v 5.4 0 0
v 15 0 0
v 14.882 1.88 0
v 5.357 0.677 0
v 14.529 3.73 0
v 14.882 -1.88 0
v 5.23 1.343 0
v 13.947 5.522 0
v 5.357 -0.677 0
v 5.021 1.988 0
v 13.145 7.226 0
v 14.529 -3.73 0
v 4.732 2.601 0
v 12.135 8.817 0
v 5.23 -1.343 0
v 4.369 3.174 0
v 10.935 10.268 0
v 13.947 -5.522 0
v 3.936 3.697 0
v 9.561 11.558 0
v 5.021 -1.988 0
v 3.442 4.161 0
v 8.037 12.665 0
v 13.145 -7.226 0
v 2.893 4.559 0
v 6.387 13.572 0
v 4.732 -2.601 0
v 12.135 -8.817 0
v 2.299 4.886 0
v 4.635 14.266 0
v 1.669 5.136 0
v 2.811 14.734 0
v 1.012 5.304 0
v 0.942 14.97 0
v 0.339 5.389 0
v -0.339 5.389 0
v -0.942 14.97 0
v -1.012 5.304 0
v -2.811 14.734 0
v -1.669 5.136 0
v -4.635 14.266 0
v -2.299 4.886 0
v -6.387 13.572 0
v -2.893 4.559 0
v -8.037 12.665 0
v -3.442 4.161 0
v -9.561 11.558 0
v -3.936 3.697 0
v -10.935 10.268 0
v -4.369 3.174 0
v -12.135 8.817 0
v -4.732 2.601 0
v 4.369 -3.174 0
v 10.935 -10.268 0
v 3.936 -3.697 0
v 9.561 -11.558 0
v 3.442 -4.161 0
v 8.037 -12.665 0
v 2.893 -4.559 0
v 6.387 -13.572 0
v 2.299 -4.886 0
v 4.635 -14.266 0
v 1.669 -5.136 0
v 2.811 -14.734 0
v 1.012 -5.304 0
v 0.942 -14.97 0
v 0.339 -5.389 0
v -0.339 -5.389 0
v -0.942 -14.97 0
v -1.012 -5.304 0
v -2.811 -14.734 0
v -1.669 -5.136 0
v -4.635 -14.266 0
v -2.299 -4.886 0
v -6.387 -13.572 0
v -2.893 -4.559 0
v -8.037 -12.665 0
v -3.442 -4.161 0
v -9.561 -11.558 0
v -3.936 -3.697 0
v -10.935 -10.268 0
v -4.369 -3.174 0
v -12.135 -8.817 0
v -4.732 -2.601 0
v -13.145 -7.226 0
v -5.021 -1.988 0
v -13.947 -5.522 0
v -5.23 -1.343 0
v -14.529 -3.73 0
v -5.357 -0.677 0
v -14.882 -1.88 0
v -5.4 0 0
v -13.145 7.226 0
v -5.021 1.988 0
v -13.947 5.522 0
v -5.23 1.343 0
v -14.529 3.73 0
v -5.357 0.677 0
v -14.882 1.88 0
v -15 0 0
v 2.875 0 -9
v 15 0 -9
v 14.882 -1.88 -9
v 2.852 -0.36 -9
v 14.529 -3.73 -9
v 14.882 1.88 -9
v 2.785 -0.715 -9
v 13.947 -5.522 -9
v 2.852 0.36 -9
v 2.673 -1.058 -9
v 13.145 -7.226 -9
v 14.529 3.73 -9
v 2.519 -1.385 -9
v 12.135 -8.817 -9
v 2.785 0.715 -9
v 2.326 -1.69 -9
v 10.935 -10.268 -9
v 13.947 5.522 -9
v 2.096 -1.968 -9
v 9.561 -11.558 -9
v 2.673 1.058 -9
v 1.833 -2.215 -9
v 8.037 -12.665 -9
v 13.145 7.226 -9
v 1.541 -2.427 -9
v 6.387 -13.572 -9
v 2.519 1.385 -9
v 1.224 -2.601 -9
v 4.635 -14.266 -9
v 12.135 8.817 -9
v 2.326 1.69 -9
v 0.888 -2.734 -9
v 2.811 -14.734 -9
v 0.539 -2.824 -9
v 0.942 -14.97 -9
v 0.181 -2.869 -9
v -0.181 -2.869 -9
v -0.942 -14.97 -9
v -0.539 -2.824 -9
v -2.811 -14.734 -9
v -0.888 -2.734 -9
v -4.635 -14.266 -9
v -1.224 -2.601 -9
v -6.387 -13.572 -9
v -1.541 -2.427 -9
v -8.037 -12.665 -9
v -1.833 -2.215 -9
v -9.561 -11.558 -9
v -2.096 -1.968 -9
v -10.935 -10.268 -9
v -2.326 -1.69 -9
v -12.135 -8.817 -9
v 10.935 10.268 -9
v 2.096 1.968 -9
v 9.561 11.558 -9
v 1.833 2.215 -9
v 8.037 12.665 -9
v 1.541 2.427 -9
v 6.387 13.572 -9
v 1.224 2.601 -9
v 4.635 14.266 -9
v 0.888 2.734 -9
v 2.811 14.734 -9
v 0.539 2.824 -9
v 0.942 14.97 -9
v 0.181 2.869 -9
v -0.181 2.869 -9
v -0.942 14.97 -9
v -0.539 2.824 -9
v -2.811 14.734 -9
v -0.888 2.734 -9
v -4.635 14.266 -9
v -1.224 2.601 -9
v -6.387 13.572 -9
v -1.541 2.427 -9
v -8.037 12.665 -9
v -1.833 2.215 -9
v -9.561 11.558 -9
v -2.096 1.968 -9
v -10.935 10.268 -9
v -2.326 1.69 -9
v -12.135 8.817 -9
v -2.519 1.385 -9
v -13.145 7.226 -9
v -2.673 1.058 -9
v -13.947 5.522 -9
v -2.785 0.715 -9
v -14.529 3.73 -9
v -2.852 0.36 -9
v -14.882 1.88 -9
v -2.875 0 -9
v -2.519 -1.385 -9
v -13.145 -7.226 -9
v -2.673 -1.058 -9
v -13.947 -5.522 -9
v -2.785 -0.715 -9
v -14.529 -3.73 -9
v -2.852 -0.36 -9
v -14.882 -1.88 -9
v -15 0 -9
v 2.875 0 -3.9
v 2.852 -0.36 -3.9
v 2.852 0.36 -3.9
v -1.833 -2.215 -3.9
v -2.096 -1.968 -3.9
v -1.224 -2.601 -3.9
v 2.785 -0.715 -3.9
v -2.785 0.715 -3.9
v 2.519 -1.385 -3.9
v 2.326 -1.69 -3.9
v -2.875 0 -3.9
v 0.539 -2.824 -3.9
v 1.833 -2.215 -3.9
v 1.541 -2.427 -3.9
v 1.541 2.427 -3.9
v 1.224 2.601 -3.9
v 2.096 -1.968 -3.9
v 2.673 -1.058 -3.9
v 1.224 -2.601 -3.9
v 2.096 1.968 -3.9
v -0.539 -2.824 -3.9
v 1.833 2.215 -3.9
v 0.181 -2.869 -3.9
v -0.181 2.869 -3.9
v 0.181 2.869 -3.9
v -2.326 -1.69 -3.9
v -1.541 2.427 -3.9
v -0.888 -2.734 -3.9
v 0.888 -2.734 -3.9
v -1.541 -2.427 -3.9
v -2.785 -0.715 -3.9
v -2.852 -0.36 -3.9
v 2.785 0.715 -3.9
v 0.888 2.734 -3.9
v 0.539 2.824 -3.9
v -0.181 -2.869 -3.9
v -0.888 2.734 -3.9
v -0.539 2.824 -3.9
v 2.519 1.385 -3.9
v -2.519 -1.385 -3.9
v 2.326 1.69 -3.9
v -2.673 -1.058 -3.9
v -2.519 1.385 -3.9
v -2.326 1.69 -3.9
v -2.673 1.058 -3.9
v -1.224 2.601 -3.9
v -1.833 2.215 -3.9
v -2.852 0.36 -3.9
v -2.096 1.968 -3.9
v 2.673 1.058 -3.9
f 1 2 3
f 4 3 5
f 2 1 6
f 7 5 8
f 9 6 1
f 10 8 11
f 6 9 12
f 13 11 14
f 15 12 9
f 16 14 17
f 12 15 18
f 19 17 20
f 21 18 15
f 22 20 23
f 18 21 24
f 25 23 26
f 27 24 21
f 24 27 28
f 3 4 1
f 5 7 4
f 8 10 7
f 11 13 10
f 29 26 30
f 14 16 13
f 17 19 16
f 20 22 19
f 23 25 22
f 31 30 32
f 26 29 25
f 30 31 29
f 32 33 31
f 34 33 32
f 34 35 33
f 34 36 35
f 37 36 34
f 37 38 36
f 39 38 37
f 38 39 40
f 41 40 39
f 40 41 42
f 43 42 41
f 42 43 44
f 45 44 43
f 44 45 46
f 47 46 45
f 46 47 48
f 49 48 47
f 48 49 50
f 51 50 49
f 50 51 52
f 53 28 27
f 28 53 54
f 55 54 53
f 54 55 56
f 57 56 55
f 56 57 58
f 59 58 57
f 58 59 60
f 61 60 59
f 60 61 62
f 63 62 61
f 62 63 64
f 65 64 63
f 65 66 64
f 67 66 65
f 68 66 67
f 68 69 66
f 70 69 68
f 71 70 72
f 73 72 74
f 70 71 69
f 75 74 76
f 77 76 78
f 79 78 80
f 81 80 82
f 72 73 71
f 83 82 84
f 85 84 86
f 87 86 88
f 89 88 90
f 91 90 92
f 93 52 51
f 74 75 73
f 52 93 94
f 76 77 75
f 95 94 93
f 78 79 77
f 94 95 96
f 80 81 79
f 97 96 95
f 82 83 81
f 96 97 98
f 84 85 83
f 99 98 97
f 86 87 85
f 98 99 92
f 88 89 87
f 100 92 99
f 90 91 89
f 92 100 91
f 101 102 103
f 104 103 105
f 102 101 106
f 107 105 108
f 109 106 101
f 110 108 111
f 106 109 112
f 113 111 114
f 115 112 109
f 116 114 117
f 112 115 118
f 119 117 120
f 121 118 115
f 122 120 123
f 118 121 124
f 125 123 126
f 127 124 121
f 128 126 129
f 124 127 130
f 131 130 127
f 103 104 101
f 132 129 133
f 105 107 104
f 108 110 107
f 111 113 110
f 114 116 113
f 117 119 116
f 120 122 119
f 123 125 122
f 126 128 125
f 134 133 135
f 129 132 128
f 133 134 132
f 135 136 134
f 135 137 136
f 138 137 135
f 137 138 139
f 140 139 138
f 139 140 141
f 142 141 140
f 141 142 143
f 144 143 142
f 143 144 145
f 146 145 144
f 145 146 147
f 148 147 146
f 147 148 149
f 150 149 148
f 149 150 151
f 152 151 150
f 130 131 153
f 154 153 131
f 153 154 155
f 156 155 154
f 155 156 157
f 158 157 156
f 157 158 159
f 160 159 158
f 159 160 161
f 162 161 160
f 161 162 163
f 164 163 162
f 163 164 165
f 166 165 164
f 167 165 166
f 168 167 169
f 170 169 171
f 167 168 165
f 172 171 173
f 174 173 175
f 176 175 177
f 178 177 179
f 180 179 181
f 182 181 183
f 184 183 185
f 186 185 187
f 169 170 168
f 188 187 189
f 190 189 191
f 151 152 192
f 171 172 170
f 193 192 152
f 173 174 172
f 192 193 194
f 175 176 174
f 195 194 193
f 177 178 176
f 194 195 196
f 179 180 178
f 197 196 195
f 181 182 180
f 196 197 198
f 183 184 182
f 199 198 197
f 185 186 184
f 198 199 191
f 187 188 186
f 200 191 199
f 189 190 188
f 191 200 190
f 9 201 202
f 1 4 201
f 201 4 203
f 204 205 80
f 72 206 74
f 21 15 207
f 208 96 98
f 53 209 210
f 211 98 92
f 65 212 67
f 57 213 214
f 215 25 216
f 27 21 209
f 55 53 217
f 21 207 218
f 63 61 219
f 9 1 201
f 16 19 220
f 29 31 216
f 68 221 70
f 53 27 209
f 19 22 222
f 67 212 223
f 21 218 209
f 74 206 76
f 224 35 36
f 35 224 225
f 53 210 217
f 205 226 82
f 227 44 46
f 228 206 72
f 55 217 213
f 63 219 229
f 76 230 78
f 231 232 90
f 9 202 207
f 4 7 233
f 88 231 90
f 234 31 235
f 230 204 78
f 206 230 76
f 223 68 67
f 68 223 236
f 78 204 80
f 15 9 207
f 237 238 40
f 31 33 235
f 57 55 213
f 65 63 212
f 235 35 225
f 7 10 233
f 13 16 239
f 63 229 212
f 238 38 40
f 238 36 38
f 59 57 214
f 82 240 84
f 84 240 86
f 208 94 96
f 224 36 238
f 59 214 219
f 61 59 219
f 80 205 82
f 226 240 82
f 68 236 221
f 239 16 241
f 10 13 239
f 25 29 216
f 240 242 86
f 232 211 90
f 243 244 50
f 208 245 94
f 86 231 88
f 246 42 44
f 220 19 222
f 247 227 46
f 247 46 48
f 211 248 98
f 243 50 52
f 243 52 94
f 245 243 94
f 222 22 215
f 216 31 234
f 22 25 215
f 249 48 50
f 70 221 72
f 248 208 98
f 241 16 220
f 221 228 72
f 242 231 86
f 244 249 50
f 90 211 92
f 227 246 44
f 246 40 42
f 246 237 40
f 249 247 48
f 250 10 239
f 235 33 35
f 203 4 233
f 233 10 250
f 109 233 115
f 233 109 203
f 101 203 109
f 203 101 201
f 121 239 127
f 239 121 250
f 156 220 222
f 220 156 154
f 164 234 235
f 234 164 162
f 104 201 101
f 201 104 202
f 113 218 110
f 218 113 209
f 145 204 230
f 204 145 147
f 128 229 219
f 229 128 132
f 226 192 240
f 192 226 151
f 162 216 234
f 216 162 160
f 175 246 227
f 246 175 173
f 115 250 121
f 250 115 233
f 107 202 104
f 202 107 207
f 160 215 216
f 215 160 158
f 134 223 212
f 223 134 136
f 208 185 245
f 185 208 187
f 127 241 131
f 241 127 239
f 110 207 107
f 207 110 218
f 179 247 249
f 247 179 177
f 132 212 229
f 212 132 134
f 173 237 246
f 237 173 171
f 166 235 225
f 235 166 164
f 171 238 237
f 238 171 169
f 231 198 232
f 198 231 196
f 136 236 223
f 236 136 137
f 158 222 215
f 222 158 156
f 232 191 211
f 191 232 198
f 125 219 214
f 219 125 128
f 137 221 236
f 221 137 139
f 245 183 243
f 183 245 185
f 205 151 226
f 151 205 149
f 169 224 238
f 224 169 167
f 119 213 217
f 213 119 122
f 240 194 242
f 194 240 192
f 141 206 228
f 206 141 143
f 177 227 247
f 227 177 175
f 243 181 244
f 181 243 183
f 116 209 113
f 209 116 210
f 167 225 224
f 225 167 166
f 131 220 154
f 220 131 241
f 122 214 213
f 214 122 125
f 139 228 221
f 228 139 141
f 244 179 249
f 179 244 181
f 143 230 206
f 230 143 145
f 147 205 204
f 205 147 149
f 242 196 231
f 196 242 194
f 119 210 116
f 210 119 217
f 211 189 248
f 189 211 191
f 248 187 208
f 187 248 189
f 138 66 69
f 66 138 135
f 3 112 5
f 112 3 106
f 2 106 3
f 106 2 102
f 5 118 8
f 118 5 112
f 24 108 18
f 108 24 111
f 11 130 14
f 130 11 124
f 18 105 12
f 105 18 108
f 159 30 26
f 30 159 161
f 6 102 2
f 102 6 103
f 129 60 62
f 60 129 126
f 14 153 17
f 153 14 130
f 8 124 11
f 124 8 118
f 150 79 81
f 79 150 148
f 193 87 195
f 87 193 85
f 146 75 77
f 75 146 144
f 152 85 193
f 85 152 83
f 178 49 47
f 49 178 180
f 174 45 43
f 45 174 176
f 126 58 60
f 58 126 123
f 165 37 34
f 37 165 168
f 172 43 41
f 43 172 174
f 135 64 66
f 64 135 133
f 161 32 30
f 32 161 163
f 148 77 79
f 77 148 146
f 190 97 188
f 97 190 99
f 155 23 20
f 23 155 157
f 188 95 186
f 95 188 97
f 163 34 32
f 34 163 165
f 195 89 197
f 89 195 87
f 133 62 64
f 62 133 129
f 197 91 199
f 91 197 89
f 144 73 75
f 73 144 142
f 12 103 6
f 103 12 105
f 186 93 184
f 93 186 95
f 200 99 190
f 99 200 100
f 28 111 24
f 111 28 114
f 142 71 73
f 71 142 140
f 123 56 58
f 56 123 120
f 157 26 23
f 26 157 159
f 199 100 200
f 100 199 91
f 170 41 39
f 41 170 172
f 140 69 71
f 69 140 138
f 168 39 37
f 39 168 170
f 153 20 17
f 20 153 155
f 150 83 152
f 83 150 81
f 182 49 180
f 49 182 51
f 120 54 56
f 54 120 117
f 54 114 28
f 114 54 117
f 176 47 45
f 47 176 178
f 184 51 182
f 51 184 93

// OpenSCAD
$fn = 50;


difference() {
	union() {
		translate(v = [0, 0, -9.0000000000]) {
			cylinder(h = 9, r = 15.0000000000);
		}
	}
	union() {
		translate(v = [0, 0, 0]) {
			rotate(a = [0, 0, 0]) {
				difference() {
					union() {
						#translate(v = [0, 0, -9.0000000000]) {
							cylinder(h = 9, r = 2.6000000000);
						}
						#translate(v = [0, 0, -3.9000000000]) {
							cylinder(h = 3.9000000000, r1 = 2.8750000000, r2 = 5.4000000000);
						}
						#translate(v = [0, 0, -9.0000000000]) {
							cylinder(h = 9, r = 2.8750000000);
						}
						#translate(v = [0, 0, -9.0000000000]) {
							cylinder(h = 9, r = 2.6000000000);
						}
					}
					union();
				}
			}
		}
	}
}
